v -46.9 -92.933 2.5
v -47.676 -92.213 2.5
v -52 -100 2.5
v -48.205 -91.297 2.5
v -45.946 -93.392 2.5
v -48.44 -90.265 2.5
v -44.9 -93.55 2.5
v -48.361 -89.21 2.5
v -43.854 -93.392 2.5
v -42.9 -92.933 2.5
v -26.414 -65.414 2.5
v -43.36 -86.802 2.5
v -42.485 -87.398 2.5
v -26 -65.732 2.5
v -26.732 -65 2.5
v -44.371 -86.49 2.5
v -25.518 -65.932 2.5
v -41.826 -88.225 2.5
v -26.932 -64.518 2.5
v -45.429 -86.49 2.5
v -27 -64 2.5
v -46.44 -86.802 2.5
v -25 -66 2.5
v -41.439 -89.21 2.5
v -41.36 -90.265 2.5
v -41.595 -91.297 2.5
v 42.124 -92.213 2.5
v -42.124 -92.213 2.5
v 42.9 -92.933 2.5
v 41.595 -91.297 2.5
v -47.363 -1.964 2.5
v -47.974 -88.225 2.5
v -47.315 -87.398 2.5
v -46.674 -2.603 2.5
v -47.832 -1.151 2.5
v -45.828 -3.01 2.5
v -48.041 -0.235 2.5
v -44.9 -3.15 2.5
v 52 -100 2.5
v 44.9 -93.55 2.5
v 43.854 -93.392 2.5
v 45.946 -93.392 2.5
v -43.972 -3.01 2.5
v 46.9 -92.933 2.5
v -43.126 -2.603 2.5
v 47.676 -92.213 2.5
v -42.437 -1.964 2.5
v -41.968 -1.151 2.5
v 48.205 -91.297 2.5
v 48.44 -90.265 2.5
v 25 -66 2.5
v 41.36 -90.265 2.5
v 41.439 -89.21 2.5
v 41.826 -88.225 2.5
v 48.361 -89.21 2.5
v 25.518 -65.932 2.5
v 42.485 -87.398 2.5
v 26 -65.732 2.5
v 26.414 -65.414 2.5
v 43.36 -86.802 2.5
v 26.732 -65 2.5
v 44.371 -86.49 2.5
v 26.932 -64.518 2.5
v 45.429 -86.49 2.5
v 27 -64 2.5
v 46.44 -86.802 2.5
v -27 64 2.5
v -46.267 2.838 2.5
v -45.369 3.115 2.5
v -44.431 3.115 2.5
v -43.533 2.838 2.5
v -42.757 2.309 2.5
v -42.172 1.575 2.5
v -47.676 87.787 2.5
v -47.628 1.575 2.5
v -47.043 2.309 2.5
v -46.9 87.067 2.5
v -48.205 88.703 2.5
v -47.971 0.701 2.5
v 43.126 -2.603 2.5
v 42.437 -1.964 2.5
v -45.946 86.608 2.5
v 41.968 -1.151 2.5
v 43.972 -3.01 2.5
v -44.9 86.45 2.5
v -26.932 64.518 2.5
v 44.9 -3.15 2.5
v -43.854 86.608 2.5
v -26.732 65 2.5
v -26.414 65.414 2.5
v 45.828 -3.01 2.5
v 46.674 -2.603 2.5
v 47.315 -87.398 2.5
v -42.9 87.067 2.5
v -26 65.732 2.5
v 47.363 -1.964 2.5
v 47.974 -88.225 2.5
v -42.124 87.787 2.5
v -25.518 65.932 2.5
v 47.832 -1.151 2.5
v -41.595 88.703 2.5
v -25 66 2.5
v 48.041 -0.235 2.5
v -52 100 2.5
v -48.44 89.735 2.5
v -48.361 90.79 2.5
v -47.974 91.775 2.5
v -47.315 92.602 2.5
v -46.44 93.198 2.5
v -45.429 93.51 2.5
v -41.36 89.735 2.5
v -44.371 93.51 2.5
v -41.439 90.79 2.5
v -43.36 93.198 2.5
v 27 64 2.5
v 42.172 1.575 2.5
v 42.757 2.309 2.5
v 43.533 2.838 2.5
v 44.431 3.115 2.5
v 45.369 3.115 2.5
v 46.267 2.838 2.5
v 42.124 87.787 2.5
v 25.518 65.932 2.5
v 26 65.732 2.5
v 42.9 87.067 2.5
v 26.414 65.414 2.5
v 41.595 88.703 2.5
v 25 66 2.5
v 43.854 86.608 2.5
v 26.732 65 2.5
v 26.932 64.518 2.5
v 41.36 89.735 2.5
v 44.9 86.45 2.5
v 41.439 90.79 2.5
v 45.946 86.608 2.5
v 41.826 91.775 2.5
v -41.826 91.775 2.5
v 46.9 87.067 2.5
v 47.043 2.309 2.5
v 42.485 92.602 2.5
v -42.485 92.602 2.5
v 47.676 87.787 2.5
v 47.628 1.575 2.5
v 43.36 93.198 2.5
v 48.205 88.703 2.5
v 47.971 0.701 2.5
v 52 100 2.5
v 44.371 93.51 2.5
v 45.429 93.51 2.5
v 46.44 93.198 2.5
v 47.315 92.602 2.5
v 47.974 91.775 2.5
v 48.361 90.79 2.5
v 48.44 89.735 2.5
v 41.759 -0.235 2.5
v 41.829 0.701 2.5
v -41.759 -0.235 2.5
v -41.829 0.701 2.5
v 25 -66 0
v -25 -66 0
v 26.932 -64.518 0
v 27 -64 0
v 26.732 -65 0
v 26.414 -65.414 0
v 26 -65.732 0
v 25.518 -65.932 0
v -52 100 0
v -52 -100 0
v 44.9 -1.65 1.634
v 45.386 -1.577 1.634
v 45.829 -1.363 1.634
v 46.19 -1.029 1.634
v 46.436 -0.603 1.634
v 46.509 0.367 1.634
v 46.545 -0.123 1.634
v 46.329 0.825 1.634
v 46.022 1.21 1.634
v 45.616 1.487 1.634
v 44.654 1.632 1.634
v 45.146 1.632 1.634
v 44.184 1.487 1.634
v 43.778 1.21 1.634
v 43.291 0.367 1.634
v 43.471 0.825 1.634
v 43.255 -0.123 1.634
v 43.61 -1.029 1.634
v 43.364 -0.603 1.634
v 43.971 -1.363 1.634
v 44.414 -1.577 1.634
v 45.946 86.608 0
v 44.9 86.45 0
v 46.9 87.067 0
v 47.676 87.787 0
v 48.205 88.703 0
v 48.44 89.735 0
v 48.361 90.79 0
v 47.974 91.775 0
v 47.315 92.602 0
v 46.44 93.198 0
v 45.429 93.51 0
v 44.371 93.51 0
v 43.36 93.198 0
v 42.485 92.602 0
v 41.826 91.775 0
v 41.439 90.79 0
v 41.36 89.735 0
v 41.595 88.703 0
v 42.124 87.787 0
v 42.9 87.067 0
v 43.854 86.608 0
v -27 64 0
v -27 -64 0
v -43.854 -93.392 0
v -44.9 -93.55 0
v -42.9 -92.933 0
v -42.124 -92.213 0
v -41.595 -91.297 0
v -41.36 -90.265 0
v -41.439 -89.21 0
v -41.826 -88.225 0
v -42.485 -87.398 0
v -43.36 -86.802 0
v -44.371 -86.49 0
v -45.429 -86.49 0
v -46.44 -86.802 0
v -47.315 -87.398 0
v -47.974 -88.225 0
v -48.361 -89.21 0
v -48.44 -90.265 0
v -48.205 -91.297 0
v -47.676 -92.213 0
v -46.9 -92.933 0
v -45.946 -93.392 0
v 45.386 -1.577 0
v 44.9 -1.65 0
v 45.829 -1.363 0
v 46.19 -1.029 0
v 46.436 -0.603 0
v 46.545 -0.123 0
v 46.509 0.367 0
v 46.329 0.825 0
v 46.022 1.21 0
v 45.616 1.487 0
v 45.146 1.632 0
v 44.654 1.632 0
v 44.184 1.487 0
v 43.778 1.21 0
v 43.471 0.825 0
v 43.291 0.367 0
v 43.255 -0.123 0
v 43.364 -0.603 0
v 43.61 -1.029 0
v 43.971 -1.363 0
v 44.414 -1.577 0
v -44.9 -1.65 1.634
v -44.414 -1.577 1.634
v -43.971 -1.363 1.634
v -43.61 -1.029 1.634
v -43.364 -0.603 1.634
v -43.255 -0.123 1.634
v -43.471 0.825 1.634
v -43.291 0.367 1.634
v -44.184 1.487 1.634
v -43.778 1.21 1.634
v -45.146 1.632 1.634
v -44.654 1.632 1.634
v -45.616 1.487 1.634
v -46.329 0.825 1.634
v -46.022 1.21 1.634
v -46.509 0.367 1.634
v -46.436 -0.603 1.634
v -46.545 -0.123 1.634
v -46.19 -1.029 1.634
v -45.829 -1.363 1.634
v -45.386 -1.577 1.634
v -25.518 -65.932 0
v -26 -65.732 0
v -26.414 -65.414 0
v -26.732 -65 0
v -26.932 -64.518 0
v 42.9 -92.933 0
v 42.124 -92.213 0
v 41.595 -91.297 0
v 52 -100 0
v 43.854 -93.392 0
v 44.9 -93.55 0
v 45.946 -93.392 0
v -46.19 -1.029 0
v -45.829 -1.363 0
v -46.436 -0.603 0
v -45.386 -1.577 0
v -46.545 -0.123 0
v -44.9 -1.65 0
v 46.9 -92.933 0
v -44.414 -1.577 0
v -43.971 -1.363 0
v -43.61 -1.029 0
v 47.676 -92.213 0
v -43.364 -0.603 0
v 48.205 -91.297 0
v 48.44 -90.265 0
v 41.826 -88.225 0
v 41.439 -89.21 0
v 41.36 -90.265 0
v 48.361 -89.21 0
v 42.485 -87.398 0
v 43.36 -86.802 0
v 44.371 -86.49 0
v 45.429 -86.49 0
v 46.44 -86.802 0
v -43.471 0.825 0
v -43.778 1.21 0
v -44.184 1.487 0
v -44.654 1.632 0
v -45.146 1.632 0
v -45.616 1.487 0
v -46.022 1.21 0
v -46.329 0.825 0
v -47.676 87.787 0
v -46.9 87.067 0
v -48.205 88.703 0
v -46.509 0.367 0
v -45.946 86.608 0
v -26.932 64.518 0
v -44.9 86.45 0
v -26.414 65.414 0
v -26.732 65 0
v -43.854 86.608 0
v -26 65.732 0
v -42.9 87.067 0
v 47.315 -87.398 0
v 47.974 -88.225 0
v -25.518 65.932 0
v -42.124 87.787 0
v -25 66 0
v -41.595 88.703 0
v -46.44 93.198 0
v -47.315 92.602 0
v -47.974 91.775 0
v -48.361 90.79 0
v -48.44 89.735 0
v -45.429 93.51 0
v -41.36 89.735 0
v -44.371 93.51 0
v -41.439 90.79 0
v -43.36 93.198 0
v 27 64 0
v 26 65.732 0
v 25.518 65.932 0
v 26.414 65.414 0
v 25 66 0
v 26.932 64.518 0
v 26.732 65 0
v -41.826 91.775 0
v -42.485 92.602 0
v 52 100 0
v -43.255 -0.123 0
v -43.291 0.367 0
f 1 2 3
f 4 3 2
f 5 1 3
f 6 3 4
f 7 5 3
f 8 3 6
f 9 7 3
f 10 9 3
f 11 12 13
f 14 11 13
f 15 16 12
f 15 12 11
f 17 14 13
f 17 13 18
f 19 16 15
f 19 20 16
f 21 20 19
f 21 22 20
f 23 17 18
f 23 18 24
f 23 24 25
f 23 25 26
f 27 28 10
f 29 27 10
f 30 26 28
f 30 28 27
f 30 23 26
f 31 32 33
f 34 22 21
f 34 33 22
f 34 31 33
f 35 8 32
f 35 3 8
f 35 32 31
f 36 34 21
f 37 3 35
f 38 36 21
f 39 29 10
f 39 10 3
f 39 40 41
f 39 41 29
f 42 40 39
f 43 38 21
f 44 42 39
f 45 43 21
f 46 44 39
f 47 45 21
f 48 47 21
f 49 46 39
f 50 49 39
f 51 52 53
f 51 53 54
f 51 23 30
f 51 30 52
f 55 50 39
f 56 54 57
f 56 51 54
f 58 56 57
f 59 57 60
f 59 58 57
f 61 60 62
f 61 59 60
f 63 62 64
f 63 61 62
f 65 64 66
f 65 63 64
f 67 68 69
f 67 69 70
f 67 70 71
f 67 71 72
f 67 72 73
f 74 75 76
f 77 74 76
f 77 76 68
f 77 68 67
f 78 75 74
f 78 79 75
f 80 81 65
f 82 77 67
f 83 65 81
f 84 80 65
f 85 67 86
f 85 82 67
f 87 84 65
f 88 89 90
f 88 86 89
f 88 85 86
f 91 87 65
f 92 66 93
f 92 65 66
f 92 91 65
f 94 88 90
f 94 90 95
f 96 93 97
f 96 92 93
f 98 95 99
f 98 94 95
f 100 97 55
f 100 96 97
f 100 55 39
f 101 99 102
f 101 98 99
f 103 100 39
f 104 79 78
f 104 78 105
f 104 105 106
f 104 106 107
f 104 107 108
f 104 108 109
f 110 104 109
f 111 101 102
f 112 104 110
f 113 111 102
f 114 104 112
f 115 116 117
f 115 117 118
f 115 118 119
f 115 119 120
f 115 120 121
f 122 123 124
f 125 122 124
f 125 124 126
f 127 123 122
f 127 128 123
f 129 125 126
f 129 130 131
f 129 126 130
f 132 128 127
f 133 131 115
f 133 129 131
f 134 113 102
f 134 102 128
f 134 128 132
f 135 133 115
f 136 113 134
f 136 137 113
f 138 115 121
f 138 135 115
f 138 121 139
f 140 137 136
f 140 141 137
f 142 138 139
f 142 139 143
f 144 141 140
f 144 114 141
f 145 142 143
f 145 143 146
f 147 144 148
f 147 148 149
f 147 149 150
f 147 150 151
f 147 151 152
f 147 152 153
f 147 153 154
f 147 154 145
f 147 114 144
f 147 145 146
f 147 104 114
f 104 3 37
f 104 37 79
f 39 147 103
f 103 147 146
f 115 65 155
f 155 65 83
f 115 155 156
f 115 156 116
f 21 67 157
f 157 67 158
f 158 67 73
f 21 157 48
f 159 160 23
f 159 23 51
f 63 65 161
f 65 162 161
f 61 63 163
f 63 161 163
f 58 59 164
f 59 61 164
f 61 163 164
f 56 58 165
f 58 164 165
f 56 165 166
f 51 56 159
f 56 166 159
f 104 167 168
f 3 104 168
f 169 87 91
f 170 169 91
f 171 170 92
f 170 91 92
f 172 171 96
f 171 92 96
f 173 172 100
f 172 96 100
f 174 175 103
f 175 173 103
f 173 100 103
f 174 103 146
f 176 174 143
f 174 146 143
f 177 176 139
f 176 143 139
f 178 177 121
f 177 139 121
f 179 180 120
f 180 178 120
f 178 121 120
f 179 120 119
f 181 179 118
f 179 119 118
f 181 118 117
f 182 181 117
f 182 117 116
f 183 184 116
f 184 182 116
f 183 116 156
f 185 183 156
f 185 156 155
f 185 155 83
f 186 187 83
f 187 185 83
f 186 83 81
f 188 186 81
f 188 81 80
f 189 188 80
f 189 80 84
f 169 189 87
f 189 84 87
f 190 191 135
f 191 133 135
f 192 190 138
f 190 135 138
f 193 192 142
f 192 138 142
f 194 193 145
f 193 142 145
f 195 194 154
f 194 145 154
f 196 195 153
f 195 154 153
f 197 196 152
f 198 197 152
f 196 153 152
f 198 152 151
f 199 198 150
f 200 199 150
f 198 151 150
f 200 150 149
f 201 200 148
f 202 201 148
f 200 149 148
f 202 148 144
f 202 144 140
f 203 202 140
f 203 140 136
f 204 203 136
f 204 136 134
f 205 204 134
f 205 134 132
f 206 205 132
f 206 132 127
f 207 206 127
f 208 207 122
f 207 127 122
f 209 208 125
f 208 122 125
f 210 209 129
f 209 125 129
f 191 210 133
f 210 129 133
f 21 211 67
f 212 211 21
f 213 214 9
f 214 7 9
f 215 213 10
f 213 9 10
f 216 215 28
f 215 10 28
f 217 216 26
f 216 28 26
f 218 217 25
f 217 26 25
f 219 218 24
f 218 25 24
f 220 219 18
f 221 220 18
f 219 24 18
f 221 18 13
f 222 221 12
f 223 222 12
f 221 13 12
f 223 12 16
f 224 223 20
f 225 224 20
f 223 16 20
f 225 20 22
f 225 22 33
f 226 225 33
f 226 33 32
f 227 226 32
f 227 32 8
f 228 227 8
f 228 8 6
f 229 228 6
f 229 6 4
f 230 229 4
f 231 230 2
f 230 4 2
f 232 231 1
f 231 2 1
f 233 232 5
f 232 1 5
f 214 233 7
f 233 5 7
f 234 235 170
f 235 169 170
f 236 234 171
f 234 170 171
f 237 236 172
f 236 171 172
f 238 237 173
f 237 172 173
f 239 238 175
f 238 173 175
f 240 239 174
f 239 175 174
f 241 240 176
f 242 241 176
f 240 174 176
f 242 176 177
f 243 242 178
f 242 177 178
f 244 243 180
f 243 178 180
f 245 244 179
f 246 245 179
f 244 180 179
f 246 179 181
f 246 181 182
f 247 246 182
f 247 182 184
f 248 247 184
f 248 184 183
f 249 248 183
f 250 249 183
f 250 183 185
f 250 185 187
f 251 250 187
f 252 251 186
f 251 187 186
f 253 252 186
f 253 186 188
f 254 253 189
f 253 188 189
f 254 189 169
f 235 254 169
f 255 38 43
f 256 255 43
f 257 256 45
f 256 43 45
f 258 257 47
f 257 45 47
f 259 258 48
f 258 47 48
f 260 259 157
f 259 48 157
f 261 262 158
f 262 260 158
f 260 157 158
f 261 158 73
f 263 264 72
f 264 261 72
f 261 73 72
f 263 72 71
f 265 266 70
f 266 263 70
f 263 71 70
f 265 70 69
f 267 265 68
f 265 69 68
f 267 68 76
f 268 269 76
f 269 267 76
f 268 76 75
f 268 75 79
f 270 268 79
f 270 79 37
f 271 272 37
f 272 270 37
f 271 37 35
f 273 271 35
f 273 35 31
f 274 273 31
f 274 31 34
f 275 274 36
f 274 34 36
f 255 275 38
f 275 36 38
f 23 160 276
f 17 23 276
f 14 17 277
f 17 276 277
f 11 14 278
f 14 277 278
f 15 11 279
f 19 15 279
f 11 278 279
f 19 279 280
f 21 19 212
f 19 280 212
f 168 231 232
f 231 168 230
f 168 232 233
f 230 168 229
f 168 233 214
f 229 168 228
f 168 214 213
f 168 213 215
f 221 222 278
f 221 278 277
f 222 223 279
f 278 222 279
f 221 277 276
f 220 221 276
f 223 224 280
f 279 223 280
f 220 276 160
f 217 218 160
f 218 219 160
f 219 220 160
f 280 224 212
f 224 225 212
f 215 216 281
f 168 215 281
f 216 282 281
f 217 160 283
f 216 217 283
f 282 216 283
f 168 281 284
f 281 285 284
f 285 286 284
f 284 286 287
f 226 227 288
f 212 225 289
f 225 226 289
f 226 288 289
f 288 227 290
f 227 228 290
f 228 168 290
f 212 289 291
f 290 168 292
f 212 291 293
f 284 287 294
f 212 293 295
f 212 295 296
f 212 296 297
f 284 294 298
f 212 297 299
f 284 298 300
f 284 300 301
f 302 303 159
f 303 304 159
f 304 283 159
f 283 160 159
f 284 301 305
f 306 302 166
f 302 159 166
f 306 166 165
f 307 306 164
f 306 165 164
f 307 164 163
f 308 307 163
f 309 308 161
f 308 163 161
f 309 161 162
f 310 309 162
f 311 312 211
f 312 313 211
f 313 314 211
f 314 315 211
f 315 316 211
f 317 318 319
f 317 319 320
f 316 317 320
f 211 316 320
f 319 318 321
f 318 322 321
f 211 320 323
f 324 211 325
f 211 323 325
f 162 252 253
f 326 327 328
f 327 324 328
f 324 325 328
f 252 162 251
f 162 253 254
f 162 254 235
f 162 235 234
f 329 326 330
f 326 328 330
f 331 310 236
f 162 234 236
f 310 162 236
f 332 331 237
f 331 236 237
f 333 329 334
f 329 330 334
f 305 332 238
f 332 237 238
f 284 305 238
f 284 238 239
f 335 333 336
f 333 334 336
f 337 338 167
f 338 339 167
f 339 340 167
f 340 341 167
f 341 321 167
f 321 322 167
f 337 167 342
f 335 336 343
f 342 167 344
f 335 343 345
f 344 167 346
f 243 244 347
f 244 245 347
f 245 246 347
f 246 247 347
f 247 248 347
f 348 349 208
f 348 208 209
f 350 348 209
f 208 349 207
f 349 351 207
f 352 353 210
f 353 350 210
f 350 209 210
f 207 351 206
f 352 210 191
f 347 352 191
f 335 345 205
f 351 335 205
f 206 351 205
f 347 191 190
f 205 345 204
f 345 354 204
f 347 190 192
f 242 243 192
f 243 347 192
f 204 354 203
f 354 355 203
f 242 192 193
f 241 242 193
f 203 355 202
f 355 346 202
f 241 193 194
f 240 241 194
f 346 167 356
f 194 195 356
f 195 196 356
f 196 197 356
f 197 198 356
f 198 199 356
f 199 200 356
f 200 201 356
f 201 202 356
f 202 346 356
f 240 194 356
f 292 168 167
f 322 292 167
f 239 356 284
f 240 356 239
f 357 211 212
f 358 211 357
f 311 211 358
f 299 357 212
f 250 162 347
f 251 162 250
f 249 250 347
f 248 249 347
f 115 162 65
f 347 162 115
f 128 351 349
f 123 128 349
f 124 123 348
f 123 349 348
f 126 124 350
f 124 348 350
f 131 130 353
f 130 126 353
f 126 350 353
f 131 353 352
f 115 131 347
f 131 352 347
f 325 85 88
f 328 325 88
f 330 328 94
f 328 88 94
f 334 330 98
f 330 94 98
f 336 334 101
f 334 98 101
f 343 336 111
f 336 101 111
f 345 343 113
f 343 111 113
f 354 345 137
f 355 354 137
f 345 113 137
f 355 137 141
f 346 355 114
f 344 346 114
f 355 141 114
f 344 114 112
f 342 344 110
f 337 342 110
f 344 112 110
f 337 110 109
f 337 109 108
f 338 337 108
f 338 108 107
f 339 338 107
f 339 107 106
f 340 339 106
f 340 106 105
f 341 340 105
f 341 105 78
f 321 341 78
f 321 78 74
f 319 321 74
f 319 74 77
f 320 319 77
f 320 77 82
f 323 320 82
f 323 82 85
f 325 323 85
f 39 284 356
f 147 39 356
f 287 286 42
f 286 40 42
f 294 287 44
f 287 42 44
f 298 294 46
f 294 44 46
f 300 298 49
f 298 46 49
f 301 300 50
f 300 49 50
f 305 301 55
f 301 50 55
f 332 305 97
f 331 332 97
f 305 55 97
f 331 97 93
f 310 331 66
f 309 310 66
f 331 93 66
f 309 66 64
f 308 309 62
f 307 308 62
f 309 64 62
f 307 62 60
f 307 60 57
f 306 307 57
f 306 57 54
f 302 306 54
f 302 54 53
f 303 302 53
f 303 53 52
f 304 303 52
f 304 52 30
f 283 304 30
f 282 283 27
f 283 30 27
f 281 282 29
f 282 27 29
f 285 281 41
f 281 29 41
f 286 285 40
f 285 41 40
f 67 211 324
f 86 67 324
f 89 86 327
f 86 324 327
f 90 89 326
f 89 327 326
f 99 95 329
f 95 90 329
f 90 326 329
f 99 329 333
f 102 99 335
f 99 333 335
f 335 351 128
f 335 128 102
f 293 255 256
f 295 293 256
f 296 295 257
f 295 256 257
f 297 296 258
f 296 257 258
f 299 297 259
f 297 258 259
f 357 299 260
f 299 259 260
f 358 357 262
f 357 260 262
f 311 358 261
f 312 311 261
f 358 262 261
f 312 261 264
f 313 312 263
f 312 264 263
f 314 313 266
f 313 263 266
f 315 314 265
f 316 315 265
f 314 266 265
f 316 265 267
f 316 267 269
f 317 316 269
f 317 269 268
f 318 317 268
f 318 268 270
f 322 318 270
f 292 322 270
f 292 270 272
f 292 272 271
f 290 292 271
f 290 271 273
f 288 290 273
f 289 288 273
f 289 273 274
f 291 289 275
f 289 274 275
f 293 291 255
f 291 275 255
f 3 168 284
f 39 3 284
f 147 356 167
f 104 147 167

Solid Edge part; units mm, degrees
sketch "Sketch1" plane through (0, 0, 0) normal (0, 0, 1) x (1, 0, 0)
  line L0 (-52, -100) -> (52, -100)
  line L1 (52, -100) -> (52, 100)
  line L2 (52, 100) -> (-52, 100)
  line L3 (-52, 100) -> (-52, -100)
  line L4 (-25, -66) -> (25, -66)
  arc A0 (25, -66) -> (27, -64) centre (25, -64) ccw
  line L5 (27, -64) -> (27, 64)
  arc A1 (27, 64) -> (25, 66) centre (25, 64) ccw
  line L6 (25, 66) -> (-25, 66)
  arc A2 (-25, 66) -> (-27, 64) centre (-25, 64) ccw
  line L7 (-27, 64) -> (-27, -64)
  arc A3 (-25, -66) -> (-27, -64) centre (-25, -64) cw
extrude "Extrusionsausprägung_1" add sketch "Sketch1" along normal blind 2.5
hole "Bohrung_1" at (-44.9, 90, 2.5) direction (0, 0, -1) diameter 7.1 end up to next
hole "Hole1" at (44.9, 90, 2.5) direction (0, 0, -1) diameter 7.1 end up to next
hole "Hole2" at (44.9, -90, 2.5) direction (0, 0, -1) diameter 7.1 end up to next
hole "Hole3" at (-44.9, -90, 2.5) direction (0, 0, -1) diameter 7.1 end up to next
hole "Bohrung_5" at (44.9, 0, 2.5) direction (0, 0, -1) diameter 3.3 end up to next countersink diameter 6.3 countersink angle 120
hole "Hole4" at (-44.9, 0, 2.5) direction (0, 0, -1) diameter 3.3 end up to next countersink diameter 6.3 countersink angle 120
properties material "Aluminium, 2024-T4"
